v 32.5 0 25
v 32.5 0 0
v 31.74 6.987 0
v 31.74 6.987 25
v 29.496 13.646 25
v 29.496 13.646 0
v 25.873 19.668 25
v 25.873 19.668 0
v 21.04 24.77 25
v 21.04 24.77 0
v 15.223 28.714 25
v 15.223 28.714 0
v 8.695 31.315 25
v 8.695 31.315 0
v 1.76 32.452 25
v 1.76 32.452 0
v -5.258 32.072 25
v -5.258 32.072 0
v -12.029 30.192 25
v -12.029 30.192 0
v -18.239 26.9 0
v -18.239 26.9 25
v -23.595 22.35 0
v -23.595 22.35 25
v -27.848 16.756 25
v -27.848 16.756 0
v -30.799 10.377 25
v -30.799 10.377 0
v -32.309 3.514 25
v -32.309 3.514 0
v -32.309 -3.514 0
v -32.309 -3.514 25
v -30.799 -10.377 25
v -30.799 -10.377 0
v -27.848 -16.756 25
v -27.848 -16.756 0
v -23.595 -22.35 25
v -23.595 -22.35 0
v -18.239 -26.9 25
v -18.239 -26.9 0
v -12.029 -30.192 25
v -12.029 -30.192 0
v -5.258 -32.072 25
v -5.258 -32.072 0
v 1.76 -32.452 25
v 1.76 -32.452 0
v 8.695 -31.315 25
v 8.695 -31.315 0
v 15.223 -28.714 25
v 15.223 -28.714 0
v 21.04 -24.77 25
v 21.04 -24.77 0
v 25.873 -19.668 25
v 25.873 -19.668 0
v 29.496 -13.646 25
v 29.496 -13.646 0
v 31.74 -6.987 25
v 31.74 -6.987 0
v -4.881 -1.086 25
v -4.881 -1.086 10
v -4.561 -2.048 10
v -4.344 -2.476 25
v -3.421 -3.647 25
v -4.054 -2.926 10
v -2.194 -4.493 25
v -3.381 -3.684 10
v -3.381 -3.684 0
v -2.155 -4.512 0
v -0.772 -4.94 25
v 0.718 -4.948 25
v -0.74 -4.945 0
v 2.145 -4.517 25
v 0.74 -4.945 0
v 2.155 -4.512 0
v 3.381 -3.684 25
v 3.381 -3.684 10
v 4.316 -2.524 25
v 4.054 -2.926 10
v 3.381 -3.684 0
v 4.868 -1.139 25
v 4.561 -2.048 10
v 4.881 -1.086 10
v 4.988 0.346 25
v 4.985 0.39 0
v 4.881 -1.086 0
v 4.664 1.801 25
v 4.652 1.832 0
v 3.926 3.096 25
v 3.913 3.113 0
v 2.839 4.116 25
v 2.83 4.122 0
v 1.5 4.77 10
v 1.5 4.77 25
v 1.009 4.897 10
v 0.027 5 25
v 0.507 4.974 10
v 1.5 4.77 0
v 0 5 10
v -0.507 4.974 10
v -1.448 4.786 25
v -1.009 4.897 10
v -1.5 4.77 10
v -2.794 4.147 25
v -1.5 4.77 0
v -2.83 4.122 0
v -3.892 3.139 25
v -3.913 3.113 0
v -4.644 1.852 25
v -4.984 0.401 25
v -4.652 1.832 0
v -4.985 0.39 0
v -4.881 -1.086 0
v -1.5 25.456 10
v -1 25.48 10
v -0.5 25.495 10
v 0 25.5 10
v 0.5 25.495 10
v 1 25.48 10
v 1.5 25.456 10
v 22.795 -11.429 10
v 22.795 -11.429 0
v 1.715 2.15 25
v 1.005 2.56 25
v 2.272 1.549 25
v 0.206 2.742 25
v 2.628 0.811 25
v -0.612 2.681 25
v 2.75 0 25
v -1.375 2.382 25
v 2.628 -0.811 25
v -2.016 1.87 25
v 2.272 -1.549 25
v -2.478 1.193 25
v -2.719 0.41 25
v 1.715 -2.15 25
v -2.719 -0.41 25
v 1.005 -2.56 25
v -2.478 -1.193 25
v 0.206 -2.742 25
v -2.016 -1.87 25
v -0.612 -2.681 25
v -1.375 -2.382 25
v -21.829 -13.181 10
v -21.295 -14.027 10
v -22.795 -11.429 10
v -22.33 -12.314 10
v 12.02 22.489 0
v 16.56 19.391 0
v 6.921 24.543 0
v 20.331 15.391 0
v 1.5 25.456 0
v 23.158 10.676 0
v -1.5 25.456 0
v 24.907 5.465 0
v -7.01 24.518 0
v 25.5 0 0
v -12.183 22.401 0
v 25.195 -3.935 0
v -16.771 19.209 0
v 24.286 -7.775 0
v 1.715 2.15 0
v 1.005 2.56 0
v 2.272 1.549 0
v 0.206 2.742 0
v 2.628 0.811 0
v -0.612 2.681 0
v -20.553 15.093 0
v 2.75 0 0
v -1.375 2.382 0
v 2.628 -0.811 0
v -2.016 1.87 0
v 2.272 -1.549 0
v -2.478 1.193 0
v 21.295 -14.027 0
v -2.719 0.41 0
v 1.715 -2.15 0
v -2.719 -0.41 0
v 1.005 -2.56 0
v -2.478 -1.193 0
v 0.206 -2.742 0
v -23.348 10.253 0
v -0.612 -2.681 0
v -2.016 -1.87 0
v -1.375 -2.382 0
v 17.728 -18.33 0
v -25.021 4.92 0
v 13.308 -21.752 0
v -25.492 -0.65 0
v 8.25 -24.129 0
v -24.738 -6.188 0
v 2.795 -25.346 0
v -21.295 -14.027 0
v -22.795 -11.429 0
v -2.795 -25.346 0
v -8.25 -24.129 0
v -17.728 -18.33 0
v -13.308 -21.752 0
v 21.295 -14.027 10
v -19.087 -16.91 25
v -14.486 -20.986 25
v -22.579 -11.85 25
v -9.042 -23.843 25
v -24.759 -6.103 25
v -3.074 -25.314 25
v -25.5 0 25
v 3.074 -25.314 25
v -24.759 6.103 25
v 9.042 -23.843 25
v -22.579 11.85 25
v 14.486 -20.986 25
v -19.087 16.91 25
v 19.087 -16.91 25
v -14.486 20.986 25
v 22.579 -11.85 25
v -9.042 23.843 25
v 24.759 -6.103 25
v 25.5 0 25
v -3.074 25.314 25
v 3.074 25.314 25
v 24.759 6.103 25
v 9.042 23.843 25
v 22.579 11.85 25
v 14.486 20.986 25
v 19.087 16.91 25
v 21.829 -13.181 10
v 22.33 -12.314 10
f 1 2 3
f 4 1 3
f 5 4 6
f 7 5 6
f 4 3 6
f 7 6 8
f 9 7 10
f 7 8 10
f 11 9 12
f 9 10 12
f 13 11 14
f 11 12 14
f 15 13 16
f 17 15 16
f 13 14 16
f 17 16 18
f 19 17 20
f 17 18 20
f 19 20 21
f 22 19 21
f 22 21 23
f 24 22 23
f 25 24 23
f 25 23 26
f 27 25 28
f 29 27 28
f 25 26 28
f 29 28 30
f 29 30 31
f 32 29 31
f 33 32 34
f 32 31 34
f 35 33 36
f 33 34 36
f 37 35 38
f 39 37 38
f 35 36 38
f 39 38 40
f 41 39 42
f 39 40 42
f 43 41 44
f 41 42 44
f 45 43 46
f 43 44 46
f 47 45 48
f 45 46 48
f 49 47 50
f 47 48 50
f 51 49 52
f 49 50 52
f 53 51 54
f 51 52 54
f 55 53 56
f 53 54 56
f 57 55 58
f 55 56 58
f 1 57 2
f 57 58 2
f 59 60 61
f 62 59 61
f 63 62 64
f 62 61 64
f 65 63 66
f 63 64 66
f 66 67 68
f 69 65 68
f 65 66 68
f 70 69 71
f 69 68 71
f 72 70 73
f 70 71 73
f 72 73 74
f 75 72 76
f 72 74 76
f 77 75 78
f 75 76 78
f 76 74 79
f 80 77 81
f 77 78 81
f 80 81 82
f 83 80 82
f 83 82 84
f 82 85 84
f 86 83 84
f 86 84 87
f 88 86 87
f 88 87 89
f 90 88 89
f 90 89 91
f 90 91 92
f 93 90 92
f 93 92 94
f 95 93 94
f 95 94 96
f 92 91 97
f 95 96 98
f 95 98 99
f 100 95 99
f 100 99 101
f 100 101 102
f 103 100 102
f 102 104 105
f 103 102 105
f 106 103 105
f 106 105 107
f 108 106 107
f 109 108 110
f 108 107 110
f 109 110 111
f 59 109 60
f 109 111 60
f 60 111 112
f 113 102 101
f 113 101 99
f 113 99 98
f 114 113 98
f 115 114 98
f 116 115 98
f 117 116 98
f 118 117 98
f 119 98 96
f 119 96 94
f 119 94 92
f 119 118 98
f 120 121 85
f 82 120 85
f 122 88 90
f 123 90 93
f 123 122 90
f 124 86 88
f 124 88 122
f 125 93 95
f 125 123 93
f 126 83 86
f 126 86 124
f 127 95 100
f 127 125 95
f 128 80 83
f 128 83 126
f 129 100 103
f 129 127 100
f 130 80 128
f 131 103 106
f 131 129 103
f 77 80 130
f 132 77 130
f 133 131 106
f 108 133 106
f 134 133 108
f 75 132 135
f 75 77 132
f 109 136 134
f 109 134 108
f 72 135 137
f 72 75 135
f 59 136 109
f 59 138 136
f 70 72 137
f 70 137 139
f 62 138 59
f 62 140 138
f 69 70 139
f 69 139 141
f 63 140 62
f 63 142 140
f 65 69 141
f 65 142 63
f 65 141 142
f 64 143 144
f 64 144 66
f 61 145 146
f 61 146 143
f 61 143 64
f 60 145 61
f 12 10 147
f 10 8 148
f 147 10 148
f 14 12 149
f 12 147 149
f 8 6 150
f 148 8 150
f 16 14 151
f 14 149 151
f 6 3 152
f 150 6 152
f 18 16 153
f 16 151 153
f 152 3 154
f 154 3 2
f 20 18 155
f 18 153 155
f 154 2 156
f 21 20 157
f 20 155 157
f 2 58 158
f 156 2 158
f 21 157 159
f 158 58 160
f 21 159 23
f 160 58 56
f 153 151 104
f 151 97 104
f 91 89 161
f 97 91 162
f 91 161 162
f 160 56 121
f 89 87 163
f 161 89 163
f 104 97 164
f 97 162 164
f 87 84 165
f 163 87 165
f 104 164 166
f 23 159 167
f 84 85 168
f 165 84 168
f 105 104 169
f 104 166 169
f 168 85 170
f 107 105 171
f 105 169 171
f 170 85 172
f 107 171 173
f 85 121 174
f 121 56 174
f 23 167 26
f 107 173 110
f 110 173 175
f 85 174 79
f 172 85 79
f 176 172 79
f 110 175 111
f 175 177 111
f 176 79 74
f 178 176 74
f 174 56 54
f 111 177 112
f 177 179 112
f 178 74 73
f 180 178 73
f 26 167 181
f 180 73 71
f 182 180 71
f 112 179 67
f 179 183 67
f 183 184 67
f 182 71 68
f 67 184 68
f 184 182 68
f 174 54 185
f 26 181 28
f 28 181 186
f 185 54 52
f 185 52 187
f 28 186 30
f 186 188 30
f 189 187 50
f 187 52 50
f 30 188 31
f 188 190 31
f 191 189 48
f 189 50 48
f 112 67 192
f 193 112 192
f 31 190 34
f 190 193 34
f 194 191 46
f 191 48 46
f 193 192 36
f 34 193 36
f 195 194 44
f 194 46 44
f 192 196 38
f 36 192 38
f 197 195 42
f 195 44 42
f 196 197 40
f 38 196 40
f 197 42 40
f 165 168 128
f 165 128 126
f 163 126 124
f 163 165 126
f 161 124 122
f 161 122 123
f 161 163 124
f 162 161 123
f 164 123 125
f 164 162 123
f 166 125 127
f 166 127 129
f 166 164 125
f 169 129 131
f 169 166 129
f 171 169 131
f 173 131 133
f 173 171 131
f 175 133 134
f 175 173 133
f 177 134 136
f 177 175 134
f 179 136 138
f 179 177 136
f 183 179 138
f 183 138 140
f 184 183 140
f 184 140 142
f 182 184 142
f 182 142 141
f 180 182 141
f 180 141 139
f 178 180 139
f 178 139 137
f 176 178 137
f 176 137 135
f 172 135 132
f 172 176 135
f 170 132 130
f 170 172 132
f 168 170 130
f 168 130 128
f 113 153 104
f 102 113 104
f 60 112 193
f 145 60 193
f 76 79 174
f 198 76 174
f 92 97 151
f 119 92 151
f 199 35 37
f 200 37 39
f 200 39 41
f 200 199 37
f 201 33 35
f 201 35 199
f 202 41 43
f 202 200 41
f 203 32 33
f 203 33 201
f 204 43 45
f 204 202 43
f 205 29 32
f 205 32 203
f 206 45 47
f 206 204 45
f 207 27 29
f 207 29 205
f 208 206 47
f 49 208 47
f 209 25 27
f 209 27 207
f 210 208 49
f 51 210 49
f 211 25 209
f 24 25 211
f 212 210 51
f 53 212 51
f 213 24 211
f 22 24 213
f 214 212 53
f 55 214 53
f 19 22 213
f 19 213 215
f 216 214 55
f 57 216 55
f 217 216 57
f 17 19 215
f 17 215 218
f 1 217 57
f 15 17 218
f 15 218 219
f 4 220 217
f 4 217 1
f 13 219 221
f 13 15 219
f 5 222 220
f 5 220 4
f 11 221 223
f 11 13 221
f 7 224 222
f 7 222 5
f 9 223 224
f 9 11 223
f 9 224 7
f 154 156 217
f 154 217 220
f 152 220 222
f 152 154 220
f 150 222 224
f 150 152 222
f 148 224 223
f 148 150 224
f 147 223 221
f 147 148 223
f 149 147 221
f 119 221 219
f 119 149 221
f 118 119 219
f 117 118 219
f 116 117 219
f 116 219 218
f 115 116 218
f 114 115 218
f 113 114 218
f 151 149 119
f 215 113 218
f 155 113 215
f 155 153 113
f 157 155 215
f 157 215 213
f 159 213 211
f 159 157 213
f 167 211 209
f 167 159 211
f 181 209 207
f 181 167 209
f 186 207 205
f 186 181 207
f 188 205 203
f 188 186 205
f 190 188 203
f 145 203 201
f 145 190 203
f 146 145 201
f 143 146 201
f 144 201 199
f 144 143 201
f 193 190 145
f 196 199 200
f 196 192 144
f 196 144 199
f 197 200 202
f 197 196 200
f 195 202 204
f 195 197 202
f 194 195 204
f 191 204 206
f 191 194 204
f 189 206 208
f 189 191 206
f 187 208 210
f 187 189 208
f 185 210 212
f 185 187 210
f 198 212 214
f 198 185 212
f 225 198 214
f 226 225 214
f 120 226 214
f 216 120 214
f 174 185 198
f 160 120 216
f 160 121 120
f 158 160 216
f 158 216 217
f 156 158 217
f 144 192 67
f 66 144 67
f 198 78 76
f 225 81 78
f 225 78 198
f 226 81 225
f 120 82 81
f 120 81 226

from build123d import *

# Parameters (mm, degrees)
SKETCH_1_R      = 32.5
SKETCH_1_R_2    = 25.5
EXTRUDE_1_DEPTH = 25
EXTRUDE_2_DEPTH = 10
SKETCH_2_3_R    = 2.75
EXTRUDE_3_DEPTH = 25


with BuildPart() as part:
    # 草图1 → 凸台-拉伸1 (new body)
    with BuildSketch(Plane.XY):
        Circle(SKETCH_1_R)
        Circle(SKETCH_1_R_2, mode=Mode.SUBTRACT)
    extrude(amount=EXTRUDE_1_DEPTH)

    # 草图2 → 凸台-拉伸2 (add)
    with BuildSketch(Plane.XY):
        with BuildLine():
            Line((-1.5, 25.455844123), (-1.5, 4.769696007))
            ThreePointArc((-1.5, 4.769696007), (0, 5), (1.5, 4.769696007))
            Line((1.5, 4.769696007), (1.5, 25.455844123))
            ThreePointArc((1.5, 25.455844123), (0, 25.5), (-1.5, 25.455844123))
        make_face()
        with BuildLine():
            ThreePointArc((-3.38067791, -3.683886109), (-4.330127019, -2.5), (-4.88067791, -1.085809898))
            Line((-4.88067791, -1.085809898), (-22.795407685, -11.428883956))
            ThreePointArc((-22.795407685, -11.428883956), (-22.083647797, -12.75), (-21.295407685, -14.026960167))
            Line((-21.295407685, -14.026960167), (-3.38067791, -3.683886109))
        make_face()
        with BuildLine():
            ThreePointArc((4.88067791, -1.085809898), (4.330127019, -2.5), (3.38067791, -3.683886109))
            Line((3.38067791, -3.683886109), (21.295407685, -14.026960167))
            ThreePointArc((21.295407685, -14.026960167), (22.083647797, -12.75), (22.795407685, -11.428883956))
            Line((22.795407685, -11.428883956), (4.88067791, -1.085809898))
        make_face()
    extrude(amount=EXTRUDE_2_DEPTH)

    # 草图2<3> → 凸台-拉伸3 (add)
    with BuildSketch(Plane.XY):
        with BuildLine():
            ThreePointArc((1.5, 4.769696007), (0, 5), (-1.5, 4.769696007))
            ThreePointArc((-1.5, 4.769696007), (-4.330127019, 2.5), (-4.88067791, -1.085809898))
            ThreePointArc((-4.88067791, -1.085809898), (-4.330127019, -2.5), (-3.38067791, -3.683886109))
            ThreePointArc((-3.38067791, -3.683886109), (0, -5), (3.38067791, -3.683886109))
            ThreePointArc((3.38067791, -3.683886109), (4.330127019, -2.5), (4.88067791, -1.085809898))
            ThreePointArc((4.88067791, -1.085809898), (4.970079957, -0.546173254), (5, 0))
            ThreePointArc((5, 0), (4.031128874, 2.958039892), (1.5, 4.769696007))
        make_face()
        Circle(SKETCH_2_3_R, mode=Mode.SUBTRACT)
    extrude(amount=EXTRUDE_3_DEPTH)


solid = part.part
